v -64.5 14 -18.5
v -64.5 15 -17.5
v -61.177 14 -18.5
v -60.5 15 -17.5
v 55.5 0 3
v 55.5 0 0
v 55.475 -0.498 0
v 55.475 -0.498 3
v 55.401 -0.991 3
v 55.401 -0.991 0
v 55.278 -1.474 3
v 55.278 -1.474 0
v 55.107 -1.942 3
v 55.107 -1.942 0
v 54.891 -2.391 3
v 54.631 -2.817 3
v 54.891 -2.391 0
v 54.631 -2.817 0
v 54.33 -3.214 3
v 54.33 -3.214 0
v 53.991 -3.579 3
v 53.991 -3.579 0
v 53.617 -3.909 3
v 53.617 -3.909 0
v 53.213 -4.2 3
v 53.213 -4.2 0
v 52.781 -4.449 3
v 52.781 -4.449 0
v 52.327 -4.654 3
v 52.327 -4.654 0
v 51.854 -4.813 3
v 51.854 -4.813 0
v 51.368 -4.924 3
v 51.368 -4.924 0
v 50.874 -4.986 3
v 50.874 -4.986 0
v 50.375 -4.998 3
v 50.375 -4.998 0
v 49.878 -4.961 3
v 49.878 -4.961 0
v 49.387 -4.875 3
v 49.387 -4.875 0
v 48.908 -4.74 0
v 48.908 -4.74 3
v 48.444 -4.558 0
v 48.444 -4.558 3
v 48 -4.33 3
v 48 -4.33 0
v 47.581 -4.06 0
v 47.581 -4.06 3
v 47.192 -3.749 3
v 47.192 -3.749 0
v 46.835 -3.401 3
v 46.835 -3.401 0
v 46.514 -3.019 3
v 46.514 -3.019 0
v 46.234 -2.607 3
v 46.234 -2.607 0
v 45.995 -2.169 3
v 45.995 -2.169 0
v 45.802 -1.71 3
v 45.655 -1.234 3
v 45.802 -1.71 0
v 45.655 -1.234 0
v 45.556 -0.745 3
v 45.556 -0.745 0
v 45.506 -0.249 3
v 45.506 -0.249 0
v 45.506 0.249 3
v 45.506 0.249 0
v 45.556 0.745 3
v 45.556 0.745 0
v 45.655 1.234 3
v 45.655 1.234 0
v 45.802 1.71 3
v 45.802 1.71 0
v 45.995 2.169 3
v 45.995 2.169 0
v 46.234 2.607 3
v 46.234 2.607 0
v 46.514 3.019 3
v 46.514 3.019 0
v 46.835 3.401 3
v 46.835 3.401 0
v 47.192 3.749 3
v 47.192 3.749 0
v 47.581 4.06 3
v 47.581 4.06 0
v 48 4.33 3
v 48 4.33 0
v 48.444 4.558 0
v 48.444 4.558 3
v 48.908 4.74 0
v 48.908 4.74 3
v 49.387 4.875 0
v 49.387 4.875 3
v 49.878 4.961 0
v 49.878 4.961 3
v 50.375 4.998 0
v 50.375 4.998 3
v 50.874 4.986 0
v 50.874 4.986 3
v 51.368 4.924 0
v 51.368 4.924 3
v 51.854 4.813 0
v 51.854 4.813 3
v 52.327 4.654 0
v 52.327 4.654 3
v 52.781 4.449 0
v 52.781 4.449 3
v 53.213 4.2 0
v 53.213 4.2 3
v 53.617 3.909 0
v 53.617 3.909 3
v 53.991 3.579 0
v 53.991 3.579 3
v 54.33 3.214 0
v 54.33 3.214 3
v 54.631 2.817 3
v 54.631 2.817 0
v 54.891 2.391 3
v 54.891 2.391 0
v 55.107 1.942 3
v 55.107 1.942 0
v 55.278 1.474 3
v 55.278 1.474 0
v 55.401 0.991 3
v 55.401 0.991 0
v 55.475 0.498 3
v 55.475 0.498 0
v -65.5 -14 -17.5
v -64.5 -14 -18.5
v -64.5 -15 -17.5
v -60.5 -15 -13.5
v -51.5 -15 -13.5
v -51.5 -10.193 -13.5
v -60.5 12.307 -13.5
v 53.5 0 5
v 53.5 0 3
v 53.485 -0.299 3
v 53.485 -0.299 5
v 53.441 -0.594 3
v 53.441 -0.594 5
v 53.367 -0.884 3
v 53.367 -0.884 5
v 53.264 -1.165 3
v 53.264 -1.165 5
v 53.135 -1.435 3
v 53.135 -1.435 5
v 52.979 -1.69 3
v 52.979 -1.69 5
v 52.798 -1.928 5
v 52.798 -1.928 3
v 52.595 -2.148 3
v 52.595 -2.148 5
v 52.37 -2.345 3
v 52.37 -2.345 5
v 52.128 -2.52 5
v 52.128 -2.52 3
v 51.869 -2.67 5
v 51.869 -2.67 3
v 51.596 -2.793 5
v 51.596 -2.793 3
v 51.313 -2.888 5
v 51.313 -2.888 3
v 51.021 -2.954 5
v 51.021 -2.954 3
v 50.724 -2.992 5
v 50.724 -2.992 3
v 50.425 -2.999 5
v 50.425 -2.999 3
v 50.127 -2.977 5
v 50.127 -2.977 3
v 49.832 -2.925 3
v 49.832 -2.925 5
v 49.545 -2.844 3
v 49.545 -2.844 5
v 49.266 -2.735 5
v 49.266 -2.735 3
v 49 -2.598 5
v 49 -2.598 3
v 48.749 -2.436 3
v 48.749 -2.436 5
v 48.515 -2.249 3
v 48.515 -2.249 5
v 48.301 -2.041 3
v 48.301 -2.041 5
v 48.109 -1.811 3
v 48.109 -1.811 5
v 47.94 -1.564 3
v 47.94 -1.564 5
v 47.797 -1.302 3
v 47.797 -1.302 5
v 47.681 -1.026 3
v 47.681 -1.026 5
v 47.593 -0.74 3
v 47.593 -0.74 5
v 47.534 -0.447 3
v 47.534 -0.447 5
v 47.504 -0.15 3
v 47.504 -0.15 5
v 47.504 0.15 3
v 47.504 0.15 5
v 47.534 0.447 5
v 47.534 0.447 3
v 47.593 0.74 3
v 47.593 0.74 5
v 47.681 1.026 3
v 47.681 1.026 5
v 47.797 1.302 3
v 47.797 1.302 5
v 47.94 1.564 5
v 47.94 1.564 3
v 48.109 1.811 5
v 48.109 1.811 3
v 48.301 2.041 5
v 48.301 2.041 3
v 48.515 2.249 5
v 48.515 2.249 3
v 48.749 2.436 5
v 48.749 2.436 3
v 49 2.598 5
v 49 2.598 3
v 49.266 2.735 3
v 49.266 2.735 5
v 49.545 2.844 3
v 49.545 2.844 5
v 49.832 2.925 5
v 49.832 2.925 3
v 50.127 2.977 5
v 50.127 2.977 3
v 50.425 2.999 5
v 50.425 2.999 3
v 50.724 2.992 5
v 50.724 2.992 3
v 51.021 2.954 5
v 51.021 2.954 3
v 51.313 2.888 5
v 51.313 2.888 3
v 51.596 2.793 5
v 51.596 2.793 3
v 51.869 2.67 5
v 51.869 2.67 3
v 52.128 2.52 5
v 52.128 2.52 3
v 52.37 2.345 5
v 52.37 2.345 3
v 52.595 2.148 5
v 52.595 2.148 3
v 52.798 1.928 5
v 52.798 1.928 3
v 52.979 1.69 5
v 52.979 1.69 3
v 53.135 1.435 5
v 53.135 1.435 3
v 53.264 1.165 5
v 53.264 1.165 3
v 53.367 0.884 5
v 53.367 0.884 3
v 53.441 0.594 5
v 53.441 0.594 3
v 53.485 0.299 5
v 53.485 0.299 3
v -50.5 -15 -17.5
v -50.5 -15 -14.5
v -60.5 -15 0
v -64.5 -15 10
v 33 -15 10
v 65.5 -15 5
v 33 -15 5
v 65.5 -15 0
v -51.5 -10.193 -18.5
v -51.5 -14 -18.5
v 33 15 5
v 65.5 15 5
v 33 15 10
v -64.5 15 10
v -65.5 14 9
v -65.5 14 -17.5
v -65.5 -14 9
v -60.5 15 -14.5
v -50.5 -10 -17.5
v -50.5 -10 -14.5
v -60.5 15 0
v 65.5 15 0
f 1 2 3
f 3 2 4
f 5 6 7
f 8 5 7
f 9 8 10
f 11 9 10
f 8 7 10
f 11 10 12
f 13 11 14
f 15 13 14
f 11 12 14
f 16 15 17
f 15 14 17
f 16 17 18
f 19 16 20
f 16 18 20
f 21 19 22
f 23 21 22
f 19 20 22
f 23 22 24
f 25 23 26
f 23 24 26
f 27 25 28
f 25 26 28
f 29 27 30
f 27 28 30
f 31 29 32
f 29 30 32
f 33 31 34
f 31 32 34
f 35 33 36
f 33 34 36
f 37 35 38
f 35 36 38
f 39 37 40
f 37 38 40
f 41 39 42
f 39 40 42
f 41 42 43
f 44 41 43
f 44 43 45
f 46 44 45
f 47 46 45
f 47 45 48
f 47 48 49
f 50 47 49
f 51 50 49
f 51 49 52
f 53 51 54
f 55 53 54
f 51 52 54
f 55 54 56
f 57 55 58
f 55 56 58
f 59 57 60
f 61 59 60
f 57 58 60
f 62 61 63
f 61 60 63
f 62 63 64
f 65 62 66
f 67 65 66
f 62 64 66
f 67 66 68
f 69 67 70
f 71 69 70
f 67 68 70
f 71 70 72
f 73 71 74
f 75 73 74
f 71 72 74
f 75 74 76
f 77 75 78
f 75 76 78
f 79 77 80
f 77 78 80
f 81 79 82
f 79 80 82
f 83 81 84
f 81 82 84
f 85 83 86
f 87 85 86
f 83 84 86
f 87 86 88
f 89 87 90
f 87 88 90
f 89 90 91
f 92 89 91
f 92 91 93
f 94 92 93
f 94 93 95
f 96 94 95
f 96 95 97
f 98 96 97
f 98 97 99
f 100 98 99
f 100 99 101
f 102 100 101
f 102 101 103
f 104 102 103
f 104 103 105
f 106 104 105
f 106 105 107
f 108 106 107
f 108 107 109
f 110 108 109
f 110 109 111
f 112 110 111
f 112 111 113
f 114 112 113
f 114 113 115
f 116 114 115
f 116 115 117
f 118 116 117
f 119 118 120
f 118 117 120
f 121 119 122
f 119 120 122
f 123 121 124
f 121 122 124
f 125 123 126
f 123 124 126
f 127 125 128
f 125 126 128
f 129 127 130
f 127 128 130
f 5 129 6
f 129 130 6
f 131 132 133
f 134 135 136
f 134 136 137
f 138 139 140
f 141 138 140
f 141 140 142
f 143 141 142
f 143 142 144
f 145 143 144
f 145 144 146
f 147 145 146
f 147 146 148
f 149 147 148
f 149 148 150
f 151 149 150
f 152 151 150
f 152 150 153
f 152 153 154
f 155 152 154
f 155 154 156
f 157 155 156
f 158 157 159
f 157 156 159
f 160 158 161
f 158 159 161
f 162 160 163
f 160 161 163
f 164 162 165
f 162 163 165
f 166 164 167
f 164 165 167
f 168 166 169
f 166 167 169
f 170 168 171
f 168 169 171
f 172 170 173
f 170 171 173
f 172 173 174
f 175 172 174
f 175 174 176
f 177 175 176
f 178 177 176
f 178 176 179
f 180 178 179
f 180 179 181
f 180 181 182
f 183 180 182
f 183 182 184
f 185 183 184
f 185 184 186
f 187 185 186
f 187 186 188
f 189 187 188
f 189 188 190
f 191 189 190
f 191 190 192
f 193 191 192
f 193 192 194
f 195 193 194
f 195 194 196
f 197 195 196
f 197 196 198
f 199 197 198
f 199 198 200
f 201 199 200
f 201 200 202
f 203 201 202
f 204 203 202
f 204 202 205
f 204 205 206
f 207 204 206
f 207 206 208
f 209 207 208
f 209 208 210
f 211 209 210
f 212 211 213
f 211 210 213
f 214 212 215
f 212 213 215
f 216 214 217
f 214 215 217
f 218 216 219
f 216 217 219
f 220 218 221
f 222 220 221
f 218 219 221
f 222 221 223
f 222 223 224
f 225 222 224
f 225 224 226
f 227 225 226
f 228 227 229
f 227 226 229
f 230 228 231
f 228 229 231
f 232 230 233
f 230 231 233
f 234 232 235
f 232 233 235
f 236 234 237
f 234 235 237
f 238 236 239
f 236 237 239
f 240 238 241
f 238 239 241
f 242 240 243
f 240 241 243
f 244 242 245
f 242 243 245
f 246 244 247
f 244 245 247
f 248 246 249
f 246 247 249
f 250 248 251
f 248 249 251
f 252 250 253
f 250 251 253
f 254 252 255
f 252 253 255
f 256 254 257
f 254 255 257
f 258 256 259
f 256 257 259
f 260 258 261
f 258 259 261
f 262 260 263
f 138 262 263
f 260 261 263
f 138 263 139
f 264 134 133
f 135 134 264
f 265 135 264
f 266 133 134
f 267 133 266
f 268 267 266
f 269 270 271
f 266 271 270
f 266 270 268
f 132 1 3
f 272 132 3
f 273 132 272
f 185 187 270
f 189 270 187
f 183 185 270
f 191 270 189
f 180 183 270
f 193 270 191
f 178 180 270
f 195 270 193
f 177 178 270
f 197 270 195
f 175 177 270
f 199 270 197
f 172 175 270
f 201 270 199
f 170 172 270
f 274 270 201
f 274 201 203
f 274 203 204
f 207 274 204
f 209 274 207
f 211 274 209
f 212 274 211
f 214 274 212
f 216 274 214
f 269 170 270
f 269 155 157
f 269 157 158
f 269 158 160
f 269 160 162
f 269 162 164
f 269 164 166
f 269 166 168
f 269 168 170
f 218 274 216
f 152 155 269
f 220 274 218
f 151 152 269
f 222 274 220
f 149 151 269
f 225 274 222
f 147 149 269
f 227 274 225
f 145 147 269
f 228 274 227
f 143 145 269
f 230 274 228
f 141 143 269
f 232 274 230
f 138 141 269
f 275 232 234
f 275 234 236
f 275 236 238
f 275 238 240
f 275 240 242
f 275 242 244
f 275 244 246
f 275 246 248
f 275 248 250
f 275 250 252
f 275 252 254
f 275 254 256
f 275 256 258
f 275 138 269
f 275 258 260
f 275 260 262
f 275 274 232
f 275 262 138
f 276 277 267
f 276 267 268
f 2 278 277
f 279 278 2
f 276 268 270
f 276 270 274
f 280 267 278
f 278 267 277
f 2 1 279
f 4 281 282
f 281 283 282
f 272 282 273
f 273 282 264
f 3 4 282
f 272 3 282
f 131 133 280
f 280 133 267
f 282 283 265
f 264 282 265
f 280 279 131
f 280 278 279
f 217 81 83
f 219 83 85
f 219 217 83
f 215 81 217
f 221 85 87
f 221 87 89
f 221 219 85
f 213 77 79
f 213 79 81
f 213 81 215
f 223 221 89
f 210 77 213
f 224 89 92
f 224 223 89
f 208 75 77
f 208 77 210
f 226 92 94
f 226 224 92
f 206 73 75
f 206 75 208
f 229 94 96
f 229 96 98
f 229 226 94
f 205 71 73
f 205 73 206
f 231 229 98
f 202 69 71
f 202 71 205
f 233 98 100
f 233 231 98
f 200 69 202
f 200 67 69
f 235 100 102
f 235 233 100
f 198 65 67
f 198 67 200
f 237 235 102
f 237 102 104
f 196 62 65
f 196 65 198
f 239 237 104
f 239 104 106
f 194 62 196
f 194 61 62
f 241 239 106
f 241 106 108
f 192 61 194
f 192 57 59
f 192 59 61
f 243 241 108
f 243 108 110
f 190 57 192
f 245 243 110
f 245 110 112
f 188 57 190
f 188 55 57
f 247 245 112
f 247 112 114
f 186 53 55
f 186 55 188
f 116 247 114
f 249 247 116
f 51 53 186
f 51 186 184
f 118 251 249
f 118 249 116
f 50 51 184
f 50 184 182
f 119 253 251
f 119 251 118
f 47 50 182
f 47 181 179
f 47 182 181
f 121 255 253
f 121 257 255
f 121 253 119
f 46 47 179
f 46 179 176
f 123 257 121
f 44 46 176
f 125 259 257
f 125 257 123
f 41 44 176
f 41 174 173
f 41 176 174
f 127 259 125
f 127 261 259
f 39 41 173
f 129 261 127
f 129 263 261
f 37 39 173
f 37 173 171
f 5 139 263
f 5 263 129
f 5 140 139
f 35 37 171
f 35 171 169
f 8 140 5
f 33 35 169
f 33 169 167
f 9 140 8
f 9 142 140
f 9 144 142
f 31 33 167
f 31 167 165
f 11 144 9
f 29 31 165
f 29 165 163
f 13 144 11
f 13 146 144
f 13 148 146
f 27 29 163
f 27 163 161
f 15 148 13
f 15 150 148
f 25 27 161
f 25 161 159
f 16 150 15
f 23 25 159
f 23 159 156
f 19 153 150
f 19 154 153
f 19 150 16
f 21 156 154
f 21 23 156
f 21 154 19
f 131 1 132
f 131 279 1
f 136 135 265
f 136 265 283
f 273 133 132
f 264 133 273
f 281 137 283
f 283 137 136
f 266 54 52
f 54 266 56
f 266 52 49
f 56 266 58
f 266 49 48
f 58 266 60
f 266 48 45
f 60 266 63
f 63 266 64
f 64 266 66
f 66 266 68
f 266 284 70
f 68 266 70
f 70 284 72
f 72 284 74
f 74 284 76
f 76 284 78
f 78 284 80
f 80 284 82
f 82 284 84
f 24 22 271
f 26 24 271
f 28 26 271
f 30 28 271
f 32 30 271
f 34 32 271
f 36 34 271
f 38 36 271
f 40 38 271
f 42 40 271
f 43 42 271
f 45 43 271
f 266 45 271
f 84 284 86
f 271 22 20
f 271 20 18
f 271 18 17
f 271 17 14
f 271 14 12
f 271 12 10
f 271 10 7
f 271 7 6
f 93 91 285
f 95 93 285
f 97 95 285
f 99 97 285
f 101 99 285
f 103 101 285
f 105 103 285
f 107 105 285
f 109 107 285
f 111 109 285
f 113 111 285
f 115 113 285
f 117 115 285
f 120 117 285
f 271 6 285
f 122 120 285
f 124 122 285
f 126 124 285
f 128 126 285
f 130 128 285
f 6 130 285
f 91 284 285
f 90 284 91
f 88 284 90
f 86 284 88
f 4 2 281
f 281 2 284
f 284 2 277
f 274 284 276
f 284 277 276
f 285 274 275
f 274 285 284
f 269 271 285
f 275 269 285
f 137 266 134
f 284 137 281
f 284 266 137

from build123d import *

# Parameters (mm, degrees)
SKETCH033_W     = 131
SKETCH033_H     = 30
PAD012_DEPTH    = 10
SKETCH032_W     = 15
SKETCH032_H     = 30
PAD011_DEPTH    = 18.5
SKETCH030_W     = 30
SKETCH030_H     = 13.5
POCKET020_DEPTH = 10
SKETCH031_R     = 3
POCKET021_DEPTH = 10.001
SKETCH034_W     = 32.5
SKETCH034_H     = 30
POCKET022_DEPTH = 5
SKETCH040_R     = 5
POCKET028_DEPTH = 3
CHAMFER_SIZE2   = 25
CHAMFER_SIZE    = 10
CHAMFER010_SIZE = 1


with BuildPart() as part:
    # Sketch033 → Pad012 (new body)
    with BuildSketch(Plane.XY):
        Rectangle(SKETCH033_W, SKETCH033_H)
    extrude(amount=PAD012_DEPTH)

    # Sketch032 (on Face5 of Pad012) → Pad011 (join)
    with BuildSketch(Plane(origin=(0, 0, 0), x_dir=(1, 0, 0), z_dir=(0, 0, -1))):
        with Locations((-58, 0)):
            Rectangle(SKETCH032_W, SKETCH032_H)
    extrude(amount=PAD011_DEPTH)

    # Sketch030 (on Face9 of Pad011) → Pocket020 (cut)
    with BuildSketch(Plane.YZ.offset(-50.5)):
        with Locations((0, -6.75)):
            Rectangle(SKETCH030_W, SKETCH030_H)
    extrude(amount=-POCKET020_DEPTH, mode=Mode.SUBTRACT)

    # Sketch031 (on Face5 of Pocket020) → Pocket021 (cut, through all)
    with BuildSketch(Plane(origin=(0, 0, 0), x_dir=(1, 0, 0), z_dir=(0, 0, -1))):
        with Locations((50.5, 0)):
            Circle(SKETCH031_R)
    extrude(amount=-POCKET021_DEPTH, mode=Mode.SUBTRACT)

    # Sketch034 → Pocket022 (cut)
    with BuildSketch(Plane.XY.offset(10)):
        with Locations((49.25, 0)):
            Rectangle(SKETCH034_W, SKETCH034_H)
    extrude(amount=-POCKET022_DEPTH, mode=Mode.SUBTRACT)

    # Sketch040 (on Face4 of Pocket022) → Pocket028 (cut)
    with BuildSketch(Plane(origin=(0, 0, 0), x_dir=(1, 0, 0), z_dir=(0, 0, -1))):
        with Locations((50.5, 0)):
            Circle(SKETCH040_R)
    extrude(amount=-POCKET028_DEPTH, mode=Mode.SUBTRACT)

    # Chamfer
    chamfer_edges = [part.edges().sort_by_distance(p)[0] for p in [
        (-50.5, 15, -16),
    ]]
    chamfer_side = part.faces().sort_by_distance((-55.5, 15, -13.73817))[0]
    chamfer(chamfer_edges, length=CHAMFER_SIZE, length2=CHAMFER_SIZE2, reference=chamfer_side)

    # Chamfer010
    chamfer010_edges = [part.edges().sort_by_distance(p)[0] for p in [
        (-55.5, 2.5, -18.5),
        (-55.5, 2.5, -13.5),
        (-50.5, -12.5, -18.5),
        (-50.5, -12.5, -13.5),
        (-58, -15, -18.5),
        (-65.5, 0, -18.5),
        (-63, 15, -18.5),
        (-65.5, -15, -9.25),
        (-65.5, -15, 5),
        (-65.5, 0, 10),
        (-65.5, 15, 5),
        (-65.5, 15, -9.25),
    ]]
    chamfer(chamfer010_edges, length=CHAMFER010_SIZE)


solid = part.part
